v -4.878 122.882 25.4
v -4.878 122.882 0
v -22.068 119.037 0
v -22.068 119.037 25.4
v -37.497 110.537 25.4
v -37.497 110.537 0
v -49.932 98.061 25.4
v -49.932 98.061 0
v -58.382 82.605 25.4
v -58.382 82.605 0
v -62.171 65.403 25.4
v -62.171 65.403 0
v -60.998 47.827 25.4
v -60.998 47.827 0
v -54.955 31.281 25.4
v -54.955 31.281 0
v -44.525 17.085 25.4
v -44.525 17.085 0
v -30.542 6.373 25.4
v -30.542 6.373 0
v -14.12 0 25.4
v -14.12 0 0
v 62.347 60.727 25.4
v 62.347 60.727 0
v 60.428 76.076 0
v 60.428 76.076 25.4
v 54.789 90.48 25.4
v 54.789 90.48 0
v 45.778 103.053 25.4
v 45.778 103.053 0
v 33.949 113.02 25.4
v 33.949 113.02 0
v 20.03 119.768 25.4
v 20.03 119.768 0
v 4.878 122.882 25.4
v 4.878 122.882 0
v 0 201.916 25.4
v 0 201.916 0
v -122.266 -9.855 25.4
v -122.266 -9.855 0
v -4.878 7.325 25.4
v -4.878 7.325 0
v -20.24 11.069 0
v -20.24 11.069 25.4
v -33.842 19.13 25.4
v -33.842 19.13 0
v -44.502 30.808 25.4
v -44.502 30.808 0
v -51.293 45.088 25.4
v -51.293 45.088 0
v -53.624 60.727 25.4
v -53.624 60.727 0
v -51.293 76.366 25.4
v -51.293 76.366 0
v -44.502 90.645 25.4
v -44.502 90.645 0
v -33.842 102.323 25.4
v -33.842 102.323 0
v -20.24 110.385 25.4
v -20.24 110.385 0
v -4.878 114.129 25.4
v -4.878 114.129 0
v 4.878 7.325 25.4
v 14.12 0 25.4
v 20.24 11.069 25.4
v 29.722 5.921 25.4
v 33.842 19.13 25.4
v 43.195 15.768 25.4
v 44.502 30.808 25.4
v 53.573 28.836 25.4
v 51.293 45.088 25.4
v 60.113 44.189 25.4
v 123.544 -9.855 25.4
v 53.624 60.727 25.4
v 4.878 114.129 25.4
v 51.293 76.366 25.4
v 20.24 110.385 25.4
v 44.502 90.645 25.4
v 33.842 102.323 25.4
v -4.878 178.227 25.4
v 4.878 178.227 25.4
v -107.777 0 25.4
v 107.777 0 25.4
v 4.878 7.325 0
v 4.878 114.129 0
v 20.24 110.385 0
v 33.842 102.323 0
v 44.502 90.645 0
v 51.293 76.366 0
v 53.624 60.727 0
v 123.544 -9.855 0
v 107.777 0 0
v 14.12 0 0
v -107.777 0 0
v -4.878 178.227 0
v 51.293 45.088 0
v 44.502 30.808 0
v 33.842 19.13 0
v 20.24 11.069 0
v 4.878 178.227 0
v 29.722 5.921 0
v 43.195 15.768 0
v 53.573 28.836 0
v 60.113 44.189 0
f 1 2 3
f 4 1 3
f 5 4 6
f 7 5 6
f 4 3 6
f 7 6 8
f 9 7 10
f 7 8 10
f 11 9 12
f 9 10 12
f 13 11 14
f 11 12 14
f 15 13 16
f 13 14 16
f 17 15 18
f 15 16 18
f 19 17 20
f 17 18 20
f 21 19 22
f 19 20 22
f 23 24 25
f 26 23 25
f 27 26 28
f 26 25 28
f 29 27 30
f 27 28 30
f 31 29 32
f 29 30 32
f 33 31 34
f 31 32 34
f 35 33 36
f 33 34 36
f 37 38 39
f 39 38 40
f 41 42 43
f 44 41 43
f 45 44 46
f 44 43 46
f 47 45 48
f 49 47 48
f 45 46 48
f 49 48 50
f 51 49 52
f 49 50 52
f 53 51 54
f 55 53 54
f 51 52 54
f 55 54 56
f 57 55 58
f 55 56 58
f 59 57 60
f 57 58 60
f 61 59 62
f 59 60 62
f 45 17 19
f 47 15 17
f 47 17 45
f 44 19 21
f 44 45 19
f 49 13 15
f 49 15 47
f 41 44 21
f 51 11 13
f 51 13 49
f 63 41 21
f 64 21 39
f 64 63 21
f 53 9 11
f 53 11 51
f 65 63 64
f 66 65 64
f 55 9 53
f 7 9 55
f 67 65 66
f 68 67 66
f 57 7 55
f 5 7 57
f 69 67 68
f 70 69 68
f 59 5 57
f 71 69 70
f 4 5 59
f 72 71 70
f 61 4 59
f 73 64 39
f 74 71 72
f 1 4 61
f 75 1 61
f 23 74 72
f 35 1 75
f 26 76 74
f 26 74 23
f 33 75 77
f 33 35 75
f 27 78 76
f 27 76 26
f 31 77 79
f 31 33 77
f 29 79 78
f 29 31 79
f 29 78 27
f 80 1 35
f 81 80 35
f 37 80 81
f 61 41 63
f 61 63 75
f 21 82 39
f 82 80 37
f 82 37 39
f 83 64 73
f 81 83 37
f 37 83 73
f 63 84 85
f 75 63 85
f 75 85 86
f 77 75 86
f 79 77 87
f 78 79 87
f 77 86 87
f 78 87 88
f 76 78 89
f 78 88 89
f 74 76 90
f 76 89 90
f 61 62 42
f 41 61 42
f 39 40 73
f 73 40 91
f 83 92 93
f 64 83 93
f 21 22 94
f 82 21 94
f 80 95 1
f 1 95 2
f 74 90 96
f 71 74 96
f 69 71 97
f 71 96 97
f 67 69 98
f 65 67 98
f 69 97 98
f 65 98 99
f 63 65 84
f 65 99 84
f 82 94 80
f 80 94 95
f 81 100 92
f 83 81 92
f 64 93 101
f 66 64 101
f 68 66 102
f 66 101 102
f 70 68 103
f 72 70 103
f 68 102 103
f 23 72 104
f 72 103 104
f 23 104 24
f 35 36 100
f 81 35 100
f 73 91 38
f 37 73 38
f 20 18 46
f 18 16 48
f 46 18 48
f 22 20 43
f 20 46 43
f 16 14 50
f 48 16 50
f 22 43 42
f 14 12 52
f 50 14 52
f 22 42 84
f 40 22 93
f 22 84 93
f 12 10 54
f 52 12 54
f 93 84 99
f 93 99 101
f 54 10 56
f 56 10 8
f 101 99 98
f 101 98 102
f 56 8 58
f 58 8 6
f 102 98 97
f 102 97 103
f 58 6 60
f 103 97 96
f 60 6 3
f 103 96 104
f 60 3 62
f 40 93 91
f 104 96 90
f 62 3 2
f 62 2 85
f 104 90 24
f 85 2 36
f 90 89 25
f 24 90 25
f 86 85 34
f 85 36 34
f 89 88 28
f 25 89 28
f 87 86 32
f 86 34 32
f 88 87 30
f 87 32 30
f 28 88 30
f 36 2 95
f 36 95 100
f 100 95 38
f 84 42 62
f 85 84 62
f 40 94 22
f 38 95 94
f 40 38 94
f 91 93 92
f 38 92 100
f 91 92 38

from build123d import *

# Parameters (mm, degrees)
F1_DEPTH = 25.4


with BuildPart() as f1:
    # F0 (on Top) → F1 (new body)
    with BuildSketch(Plane.XY):
        Polygon((123.5442494553, -9.8546108769), (0, 201.9159130813), (-122.2657690137, -9.8546108769), align=None)
        with BuildLine():
            Line((-4.8778088885, 178.2273002568), (0, 186.6759130813))
            Line((0, 186.6759130813), (4.8778088885, 178.2273002568))
            Line((4.8778088885, 178.2273002568), (107.7773886687, 0))
            Line((107.7773886687, 0), (14.1198557448, 0))
            ThreePointArc((14.1198557448, 0), (9.5256601261, -0.8879425347), (4.8778088885, -1.4288253328))
            ThreePointArc((4.8778088885, -1.4288253328), (-4.6759216184, -1.4443391195), (-14.1198557448, 0))
            Line((-14.1198557448, 0), (-107.7773886687, 0))
            Line((-107.7773886687, 0), (-4.8778088885, 178.2273002568))
        make_face(mode=Mode.SUBTRACT)
        with BuildLine():
            Line((-4.8778088885, 114.1285764535), (-4.8778088885, 122.8822744628))
            ThreePointArc((-4.8778088885, 122.8822744628), (-62.1710636846, 65.4026461834), (-14.1198557448, 0))
            Line((-14.1198557448, 0), (-4.8778088885, 0))
            Line((-4.8778088885, 0), (-4.8778088885, 7.3248726765))
            ThreePointArc((-4.8778088885, 7.3248726765), (-53.6241625079, 60.726724565), (-4.8778088885, 114.1285764535))
        make_face()
        with BuildLine():
            ThreePointArc((62.346655104, 60.726724565), (45.7778356363, 103.052782344), (4.8778088885, 122.8822744628))
            Line((4.8778088885, 122.8822744628), (4.8778088885, 114.1285764535))
            ThreePointArc((4.8778088885, 114.1285764535), (39.6050452669, 96.8790577412), (53.6241625079, 60.726724565))
            ThreePointArc((53.6241625079, 60.726724565), (39.6050452669, 24.5743913889), (4.8778088885, 7.3248726765))
            Line((4.8778088885, 7.3248726765), (4.8778088885, 0))
            Line((4.8778088885, 0), (14.1198557448, 0))
            ThreePointArc((14.1198557448, 0), (48.8233098985, 21.9531534991), (62.346655104, 60.726724565))
        make_face()
        with BuildLine():
            ThreePointArc((4.8778088885, 114.1285764535), (0, 114.3508870729), (-4.8778088885, 114.1285764535))
            Line((-4.8778088885, 114.1285764535), (-4.8778088885, 7.3248726765))
            ThreePointArc((-4.8778088885, 7.3248726765), (0, 7.1025620571), (4.8778088885, 7.3248726765))
            Line((4.8778088885, 7.3248726765), (4.8778088885, 114.1285764535))
        make_face()
        with BuildLine():
            Line((4.8778088885, 178.2273002568), (0, 186.6759130813))
            Line((0, 186.6759130813), (-4.8778088885, 178.2273002568))
            Line((-4.8778088885, 178.2273002568), (-4.8778088885, 122.8822744628))
            ThreePointArc((-4.8778088885, 122.8822744628), (0, 123.073379669), (4.8778088885, 122.8822744628))
            Line((4.8778088885, 122.8822744628), (4.8778088885, 178.2273002568))
        make_face()
        with BuildLine():
            ThreePointArc((4.8778088885, 122.8822744628), (0, 123.073379669), (-4.8778088885, 122.8822744628))
            Line((-4.8778088885, 122.8822744628), (-4.8778088885, 114.1285764535))
            ThreePointArc((-4.8778088885, 114.1285764535), (0, 114.3508870729), (4.8778088885, 114.1285764535))
            Line((4.8778088885, 114.1285764535), (4.8778088885, 122.8822744628))
        make_face()
        with BuildLine():
            Line((-4.8778088885, 7.3248726765), (-4.8778088885, 0))
            Line((-4.8778088885, 0), (4.8778088885, 0))
            Line((4.8778088885, 0), (4.8778088885, 7.3248726765))
            ThreePointArc((4.8778088885, 7.3248726765), (0, 7.1025620571), (-4.8778088885, 7.3248726765))
        make_face()
        with BuildLine():
            Line((-4.8778088885, 0), (-14.1198557448, 0))
            ThreePointArc((-14.1198557448, 0), (-4.6759216184, -1.4443391195), (4.8778088885, -1.4288253328))
            Line((4.8778088885, -1.4288253328), (4.8778088885, 0))
            Line((4.8778088885, 0), (-4.8778088885, 0))
        make_face()
        with BuildLine():
            ThreePointArc((4.8778088885, -1.4288253328), (9.5256601261, -0.8879425347), (14.1198557448, 0))
            Line((14.1198557448, 0), (4.8778088885, 0))
            Line((4.8778088885, 0), (4.8778088885, -1.4288253328))
        make_face()
    extrude(amount=F1_DEPTH)


solid = f1.part
